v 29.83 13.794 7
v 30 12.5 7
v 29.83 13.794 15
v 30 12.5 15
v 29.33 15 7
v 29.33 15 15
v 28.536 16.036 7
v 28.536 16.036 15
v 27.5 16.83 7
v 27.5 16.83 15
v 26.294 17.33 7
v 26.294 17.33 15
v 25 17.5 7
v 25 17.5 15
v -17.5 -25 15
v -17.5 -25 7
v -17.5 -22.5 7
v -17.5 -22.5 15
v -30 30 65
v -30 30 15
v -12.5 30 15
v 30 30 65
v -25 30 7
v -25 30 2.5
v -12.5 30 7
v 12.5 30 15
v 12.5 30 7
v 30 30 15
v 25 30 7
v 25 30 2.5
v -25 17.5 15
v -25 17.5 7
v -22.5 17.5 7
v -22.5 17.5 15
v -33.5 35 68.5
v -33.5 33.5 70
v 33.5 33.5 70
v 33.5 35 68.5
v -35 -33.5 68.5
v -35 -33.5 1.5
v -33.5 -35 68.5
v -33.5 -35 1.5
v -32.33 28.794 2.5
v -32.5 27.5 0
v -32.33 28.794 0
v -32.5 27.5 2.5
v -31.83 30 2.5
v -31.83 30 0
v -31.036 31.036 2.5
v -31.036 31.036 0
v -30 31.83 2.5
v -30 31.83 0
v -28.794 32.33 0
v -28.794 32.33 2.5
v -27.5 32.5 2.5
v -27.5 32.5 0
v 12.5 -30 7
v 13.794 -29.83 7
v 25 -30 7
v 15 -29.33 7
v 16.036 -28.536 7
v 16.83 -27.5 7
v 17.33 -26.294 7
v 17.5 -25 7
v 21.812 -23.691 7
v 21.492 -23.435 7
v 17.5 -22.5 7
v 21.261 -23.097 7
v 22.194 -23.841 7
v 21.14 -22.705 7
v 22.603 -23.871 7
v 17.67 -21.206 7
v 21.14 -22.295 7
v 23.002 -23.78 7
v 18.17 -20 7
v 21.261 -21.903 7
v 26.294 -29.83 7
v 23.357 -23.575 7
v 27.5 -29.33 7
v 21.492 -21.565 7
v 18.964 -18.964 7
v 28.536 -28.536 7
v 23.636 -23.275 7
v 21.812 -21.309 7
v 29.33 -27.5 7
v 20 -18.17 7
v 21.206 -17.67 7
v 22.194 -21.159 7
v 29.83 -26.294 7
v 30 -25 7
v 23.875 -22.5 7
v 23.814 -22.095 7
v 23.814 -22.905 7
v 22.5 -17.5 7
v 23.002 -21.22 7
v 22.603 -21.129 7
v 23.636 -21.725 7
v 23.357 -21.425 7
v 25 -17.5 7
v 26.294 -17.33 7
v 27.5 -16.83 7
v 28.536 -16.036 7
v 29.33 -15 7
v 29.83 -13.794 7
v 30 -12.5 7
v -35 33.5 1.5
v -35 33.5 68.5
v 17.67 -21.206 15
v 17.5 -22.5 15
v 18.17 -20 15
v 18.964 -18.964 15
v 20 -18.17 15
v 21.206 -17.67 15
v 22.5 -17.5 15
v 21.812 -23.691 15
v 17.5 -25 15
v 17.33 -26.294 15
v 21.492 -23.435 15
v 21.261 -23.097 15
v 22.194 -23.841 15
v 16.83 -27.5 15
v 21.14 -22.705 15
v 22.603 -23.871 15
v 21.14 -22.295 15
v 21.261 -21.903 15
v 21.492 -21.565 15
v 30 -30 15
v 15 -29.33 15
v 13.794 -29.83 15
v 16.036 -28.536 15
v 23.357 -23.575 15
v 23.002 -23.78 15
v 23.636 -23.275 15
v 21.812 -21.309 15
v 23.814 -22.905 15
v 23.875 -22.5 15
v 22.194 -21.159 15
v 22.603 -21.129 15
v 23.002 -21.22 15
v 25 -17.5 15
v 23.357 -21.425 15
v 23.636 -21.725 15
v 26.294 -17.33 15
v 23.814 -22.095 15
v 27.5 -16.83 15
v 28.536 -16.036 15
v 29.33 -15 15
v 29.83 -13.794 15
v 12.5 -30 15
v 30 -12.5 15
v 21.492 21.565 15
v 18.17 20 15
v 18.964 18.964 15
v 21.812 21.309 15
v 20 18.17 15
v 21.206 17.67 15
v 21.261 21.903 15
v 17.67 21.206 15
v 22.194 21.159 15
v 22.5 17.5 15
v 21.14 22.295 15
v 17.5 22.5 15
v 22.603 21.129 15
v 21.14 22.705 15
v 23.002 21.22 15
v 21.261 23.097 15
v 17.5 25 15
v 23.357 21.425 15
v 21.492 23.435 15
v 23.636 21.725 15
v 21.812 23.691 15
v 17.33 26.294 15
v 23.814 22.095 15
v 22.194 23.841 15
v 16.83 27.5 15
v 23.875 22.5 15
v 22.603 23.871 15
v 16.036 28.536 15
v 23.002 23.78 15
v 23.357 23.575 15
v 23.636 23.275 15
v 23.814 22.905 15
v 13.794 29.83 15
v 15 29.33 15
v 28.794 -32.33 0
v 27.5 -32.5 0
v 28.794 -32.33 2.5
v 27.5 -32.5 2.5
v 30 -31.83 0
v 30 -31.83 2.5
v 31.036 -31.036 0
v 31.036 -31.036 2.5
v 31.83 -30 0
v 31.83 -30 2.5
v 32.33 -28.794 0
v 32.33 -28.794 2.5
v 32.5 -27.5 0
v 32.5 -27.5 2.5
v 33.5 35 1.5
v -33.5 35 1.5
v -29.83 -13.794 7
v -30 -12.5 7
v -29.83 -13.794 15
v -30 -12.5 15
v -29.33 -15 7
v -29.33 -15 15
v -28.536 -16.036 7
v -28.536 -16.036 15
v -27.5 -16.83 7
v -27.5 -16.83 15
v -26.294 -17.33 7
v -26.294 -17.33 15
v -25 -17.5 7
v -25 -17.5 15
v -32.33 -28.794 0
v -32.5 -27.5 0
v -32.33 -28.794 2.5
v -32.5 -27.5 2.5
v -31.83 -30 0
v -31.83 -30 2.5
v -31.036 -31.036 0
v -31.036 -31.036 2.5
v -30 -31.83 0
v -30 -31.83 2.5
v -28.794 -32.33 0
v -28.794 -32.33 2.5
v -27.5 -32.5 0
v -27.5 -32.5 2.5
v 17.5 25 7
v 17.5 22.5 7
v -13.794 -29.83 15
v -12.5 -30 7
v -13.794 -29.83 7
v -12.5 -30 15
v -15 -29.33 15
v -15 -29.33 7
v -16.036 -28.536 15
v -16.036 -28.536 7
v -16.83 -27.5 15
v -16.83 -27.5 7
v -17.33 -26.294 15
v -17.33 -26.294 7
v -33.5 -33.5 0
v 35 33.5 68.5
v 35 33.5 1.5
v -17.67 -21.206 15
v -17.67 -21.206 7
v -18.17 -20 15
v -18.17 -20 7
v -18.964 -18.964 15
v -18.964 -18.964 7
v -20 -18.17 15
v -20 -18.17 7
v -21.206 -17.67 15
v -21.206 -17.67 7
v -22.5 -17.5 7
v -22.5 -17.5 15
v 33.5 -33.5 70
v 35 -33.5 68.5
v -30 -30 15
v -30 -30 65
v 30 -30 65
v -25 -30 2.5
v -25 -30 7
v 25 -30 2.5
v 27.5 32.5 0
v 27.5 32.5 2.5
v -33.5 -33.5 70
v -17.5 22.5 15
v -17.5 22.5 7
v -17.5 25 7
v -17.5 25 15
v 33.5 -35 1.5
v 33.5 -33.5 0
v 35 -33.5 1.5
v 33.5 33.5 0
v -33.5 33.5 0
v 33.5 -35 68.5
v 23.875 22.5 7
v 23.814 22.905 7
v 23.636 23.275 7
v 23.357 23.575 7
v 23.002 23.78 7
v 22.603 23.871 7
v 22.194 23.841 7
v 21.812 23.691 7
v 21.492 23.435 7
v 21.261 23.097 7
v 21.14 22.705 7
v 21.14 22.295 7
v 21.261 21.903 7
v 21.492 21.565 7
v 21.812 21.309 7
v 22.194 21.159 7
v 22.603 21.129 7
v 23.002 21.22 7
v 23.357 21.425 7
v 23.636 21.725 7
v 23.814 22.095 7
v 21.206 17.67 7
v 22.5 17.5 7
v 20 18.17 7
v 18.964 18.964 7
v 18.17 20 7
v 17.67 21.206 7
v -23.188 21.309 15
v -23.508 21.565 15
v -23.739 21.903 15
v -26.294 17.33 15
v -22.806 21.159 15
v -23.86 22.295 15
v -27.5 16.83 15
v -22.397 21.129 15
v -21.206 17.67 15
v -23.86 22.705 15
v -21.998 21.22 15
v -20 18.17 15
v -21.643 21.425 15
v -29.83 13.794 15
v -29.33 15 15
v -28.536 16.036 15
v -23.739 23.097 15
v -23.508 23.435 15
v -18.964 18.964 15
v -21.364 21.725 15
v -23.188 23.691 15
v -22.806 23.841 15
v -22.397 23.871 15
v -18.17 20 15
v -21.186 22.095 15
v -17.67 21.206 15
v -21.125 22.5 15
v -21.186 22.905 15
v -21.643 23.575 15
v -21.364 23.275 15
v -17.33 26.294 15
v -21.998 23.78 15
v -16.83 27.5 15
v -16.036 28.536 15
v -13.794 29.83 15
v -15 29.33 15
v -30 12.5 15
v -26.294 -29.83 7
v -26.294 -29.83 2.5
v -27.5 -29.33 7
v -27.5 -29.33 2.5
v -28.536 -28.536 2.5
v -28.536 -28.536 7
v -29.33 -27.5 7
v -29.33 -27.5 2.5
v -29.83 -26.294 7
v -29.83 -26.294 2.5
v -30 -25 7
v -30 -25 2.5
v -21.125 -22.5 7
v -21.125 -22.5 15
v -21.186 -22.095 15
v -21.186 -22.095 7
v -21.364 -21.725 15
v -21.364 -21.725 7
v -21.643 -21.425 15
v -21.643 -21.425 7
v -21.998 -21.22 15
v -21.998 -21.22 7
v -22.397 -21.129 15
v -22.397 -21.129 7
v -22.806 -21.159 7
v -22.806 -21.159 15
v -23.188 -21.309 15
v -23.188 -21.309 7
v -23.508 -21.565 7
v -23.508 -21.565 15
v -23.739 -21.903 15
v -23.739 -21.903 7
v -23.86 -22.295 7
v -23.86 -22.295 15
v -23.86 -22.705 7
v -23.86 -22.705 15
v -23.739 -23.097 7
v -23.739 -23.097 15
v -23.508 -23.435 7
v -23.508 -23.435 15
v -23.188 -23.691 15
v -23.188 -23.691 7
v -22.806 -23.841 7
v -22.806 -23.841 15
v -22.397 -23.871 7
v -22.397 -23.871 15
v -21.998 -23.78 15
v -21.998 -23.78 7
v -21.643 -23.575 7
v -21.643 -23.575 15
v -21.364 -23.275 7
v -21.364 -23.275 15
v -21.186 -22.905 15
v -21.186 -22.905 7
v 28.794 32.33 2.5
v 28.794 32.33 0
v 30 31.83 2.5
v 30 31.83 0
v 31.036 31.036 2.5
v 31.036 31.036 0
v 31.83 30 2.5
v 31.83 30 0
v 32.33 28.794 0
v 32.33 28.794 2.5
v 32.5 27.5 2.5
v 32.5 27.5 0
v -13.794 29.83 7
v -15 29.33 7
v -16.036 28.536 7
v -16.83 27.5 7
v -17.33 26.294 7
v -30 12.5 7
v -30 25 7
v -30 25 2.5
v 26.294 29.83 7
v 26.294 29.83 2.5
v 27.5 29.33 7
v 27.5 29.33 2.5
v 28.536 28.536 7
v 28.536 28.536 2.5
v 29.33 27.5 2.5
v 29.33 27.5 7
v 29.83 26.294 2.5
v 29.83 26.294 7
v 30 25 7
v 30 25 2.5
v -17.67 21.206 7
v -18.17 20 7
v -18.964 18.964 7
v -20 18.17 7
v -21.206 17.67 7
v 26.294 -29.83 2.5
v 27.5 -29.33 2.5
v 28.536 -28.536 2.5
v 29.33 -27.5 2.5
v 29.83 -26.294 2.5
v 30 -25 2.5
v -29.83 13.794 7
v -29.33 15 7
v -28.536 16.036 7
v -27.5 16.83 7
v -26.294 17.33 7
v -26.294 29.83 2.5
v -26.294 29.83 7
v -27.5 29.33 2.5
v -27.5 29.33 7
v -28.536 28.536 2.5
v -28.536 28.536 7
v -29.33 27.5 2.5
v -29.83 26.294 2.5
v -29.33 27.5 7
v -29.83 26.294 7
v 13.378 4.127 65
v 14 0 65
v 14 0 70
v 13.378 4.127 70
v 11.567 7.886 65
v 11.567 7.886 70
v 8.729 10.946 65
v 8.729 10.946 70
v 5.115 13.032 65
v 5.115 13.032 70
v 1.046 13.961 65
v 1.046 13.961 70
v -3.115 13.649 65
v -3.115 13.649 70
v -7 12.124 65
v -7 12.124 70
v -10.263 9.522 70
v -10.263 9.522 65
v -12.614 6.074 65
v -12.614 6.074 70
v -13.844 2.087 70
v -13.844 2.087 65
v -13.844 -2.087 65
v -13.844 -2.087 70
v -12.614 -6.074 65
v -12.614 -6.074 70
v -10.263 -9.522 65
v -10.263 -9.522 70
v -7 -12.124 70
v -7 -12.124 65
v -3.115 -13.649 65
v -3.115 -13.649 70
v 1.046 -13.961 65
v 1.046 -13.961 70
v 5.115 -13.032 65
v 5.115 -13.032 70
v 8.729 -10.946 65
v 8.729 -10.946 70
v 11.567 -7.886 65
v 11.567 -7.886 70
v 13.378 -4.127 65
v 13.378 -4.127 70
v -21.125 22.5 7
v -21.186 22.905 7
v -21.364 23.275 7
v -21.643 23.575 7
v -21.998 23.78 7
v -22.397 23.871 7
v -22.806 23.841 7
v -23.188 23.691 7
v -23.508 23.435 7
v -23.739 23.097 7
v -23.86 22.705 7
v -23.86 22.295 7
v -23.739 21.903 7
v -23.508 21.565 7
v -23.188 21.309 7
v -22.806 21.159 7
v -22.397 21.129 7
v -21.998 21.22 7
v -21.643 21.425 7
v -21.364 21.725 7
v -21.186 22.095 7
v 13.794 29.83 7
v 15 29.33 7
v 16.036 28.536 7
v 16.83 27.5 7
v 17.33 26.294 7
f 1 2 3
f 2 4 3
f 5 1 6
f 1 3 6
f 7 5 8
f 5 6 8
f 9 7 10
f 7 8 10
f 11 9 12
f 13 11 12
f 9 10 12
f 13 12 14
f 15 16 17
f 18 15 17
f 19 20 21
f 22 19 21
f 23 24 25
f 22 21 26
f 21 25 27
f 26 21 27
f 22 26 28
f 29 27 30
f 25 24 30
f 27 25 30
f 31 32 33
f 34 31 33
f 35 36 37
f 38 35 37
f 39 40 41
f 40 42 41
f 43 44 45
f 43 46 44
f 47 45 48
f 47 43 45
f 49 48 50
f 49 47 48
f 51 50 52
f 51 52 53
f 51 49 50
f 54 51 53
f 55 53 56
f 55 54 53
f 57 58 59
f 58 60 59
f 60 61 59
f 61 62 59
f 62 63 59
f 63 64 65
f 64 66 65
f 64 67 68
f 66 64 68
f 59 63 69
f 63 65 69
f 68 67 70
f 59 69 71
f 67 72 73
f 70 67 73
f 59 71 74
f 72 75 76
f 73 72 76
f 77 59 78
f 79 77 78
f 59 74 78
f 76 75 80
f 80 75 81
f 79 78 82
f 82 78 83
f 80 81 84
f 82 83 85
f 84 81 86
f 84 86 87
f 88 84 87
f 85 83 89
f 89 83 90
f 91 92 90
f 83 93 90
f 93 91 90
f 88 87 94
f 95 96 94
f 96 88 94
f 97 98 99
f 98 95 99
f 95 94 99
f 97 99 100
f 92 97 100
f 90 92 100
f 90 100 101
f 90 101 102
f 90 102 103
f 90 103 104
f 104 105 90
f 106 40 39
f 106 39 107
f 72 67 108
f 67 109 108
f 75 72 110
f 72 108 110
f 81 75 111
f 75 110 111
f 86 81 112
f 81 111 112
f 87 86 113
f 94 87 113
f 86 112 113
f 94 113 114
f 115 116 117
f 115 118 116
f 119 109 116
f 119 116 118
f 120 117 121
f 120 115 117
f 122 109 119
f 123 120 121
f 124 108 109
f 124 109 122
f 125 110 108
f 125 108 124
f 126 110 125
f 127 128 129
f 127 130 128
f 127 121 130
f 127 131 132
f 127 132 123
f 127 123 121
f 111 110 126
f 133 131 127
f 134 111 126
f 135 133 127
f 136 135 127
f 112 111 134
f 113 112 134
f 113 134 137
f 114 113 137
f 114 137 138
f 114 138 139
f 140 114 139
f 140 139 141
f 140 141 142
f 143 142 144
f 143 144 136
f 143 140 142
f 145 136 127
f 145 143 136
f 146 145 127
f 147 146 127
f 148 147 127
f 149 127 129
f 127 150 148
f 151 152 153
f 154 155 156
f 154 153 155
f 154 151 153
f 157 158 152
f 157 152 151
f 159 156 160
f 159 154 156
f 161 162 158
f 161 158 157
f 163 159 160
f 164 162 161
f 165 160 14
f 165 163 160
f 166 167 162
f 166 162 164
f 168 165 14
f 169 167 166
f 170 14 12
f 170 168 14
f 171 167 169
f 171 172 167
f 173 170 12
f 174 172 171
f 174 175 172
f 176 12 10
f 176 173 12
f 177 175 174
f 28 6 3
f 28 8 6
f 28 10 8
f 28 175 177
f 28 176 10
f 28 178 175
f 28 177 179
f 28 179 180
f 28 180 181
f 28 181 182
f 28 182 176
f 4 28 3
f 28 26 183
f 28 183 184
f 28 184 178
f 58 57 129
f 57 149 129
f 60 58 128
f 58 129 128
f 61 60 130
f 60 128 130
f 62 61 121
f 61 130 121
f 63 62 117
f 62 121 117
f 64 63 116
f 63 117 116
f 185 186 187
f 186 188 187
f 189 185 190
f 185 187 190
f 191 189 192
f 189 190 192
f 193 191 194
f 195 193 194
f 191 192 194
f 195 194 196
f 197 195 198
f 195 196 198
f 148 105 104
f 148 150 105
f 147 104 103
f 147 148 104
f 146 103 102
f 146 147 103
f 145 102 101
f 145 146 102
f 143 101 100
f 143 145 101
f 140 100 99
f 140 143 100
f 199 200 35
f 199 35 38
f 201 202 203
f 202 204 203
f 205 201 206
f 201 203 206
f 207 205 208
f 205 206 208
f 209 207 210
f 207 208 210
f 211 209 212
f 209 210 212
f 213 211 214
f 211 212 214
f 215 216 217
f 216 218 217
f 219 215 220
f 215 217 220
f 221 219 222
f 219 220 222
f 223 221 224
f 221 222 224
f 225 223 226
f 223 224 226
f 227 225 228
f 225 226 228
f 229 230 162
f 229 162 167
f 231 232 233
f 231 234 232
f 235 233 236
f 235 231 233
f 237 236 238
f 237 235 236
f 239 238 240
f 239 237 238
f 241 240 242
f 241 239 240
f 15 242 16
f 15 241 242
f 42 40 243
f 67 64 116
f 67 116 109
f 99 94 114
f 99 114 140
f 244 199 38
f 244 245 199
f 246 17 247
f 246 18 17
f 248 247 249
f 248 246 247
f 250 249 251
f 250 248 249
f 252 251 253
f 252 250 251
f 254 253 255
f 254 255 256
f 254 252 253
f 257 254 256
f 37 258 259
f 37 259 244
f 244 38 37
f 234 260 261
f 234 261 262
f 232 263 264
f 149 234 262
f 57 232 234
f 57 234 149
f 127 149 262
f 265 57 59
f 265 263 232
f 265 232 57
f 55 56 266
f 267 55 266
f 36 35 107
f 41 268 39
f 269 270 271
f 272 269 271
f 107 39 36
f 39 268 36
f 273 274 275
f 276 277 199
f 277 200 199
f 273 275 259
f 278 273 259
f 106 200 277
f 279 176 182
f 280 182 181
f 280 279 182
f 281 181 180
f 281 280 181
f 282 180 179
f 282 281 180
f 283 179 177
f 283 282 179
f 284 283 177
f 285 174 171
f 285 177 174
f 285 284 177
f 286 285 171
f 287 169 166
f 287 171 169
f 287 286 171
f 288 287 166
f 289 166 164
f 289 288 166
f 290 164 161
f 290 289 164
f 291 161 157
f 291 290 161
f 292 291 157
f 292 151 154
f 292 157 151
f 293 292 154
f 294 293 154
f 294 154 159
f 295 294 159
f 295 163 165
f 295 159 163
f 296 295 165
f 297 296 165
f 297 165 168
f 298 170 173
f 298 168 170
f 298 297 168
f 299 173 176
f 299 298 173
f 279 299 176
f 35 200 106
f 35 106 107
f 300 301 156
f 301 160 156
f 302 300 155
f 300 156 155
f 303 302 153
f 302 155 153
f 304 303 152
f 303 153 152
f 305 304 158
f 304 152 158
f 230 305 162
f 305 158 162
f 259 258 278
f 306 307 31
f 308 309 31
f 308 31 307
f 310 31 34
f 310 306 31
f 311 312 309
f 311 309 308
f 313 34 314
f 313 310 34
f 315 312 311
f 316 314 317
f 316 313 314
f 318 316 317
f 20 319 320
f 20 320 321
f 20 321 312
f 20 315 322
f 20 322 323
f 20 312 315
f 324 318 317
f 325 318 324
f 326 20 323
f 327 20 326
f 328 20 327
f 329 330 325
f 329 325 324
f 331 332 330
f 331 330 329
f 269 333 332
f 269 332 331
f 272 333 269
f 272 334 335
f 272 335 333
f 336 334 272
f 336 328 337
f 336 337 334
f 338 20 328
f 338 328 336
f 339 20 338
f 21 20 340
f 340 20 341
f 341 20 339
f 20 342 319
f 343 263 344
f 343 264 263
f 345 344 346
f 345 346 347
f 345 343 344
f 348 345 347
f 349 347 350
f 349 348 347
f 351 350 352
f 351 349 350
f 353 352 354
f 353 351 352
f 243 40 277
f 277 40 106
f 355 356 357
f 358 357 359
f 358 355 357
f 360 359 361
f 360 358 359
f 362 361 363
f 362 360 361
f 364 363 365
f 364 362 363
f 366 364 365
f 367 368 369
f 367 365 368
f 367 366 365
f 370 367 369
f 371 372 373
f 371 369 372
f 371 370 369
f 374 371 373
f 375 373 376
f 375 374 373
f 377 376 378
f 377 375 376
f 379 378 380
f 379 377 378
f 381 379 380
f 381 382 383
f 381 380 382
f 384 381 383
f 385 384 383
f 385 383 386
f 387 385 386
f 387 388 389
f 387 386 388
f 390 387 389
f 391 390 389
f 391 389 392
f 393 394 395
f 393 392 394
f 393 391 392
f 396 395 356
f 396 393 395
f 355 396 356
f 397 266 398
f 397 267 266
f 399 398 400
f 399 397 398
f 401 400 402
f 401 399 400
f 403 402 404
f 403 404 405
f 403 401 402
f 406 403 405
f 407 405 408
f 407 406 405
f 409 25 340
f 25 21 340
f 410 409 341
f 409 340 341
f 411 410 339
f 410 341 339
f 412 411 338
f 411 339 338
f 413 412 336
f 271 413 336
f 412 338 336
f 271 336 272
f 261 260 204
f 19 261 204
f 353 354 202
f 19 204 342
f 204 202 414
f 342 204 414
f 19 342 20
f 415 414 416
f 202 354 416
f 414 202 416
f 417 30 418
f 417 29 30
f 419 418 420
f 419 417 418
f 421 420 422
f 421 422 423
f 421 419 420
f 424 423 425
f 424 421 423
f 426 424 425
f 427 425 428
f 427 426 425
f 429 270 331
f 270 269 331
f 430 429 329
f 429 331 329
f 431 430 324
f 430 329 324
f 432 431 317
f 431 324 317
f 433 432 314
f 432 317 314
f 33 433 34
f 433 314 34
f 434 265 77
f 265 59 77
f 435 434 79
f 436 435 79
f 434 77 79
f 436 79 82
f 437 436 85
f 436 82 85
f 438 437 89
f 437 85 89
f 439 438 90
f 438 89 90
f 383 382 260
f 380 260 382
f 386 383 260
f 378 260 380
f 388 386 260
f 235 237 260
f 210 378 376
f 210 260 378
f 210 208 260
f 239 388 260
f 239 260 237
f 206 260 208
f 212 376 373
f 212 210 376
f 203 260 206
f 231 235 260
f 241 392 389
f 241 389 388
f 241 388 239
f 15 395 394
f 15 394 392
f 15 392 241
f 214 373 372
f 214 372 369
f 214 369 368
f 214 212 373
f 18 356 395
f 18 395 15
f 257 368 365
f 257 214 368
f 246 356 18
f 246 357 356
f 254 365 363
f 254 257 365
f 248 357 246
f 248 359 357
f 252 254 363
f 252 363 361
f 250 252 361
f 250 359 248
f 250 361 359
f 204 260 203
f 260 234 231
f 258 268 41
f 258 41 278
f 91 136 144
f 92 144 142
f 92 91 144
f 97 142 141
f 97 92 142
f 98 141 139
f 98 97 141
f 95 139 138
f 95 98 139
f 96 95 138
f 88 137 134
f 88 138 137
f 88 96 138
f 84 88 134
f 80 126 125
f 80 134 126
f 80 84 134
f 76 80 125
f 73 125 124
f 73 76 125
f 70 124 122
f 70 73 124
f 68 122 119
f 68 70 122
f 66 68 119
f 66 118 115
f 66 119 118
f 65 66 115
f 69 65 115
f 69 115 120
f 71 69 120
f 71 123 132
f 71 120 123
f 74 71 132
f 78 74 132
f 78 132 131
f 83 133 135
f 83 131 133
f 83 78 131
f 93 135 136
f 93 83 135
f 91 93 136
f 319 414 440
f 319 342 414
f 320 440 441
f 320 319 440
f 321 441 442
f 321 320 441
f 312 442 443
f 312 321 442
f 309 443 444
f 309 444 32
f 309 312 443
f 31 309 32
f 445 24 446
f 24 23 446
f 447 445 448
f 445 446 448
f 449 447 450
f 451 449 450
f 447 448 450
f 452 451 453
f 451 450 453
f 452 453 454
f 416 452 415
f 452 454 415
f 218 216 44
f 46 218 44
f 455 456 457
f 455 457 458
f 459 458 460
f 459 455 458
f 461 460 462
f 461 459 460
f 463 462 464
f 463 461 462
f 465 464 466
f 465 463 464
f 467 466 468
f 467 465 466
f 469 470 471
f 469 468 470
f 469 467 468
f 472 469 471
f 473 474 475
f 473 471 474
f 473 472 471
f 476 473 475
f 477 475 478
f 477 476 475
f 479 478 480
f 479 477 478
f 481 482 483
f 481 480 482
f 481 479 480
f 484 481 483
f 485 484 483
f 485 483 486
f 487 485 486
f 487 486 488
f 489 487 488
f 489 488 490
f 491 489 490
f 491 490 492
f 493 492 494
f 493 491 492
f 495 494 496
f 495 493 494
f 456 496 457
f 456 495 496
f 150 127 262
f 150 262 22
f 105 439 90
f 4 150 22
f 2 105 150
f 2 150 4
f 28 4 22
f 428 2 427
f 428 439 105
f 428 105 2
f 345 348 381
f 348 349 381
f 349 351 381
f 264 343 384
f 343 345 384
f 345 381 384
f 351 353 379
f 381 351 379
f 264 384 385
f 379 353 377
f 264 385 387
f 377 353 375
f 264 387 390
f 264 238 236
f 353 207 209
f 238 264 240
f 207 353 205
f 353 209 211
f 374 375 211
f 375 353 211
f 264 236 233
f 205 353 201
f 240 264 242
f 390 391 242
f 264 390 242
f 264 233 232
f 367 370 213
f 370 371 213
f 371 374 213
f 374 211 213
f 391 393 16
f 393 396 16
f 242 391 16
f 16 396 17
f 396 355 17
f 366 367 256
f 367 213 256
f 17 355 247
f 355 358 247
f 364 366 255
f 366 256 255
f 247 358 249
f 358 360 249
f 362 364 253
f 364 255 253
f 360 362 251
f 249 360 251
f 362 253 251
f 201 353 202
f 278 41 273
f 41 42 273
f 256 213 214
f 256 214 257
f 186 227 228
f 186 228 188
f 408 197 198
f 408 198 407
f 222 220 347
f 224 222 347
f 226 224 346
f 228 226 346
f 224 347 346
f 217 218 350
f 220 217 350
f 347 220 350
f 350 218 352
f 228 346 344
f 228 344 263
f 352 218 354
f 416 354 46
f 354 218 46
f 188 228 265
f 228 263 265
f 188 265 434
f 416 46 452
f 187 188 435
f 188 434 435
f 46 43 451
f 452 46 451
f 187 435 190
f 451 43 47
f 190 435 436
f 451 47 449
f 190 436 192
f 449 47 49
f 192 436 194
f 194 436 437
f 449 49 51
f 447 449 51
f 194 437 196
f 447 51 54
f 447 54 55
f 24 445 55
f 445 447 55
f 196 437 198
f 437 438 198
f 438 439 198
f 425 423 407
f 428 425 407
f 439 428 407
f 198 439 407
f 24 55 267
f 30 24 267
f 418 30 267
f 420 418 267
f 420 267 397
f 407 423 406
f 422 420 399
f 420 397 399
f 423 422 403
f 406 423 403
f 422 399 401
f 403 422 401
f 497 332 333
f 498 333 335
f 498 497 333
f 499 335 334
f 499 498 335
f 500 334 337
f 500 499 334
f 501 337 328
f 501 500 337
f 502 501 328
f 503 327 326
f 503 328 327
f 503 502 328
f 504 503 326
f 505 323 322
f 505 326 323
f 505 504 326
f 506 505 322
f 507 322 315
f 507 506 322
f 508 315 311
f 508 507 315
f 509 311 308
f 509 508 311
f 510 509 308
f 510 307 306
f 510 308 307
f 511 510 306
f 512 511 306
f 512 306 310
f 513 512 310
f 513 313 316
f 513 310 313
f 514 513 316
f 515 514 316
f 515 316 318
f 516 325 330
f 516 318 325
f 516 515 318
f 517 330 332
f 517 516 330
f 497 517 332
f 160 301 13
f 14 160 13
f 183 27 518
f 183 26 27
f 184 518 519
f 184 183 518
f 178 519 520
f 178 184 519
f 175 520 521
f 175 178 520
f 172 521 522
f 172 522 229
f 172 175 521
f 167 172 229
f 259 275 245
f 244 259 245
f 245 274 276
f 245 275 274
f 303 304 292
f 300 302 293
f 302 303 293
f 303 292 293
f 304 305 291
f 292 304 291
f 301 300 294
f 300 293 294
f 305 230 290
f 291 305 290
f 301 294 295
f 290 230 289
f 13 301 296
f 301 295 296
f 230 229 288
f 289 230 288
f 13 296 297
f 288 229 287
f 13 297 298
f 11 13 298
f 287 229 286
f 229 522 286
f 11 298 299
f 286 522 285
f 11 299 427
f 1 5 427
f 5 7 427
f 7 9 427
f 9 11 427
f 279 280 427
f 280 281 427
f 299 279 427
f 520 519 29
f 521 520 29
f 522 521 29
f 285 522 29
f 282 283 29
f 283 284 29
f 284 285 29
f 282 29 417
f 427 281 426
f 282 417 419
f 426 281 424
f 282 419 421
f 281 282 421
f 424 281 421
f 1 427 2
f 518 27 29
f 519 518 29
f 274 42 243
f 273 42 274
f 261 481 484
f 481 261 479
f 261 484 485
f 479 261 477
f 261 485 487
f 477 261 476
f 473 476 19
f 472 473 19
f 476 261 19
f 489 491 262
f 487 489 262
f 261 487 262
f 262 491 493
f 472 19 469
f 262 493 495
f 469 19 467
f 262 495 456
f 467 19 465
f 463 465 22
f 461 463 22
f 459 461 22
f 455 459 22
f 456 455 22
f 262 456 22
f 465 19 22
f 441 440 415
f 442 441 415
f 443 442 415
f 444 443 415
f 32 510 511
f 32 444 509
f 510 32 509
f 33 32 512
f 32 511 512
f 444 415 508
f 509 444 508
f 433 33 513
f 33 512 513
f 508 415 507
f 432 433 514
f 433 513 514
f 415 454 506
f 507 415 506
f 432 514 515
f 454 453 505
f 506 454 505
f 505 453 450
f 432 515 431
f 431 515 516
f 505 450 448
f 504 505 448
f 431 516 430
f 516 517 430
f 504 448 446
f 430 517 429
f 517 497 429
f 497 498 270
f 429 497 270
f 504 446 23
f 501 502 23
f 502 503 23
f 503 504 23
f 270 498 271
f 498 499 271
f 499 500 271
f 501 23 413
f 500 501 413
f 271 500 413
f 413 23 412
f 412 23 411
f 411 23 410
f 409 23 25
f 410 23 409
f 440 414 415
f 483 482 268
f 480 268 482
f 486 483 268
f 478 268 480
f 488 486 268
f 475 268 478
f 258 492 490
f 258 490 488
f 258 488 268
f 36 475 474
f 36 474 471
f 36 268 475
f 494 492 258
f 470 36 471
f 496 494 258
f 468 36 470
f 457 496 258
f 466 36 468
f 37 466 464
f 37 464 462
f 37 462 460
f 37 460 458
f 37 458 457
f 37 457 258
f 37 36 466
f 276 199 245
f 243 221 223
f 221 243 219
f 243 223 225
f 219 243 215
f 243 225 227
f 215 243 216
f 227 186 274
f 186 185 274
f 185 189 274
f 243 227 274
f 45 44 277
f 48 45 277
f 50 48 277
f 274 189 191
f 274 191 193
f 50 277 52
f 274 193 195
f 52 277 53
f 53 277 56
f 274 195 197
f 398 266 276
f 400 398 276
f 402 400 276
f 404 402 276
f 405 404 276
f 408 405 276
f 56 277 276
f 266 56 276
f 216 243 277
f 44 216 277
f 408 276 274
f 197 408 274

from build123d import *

# Parameters (mm, degrees)
SKETCH_W        = 70
SKETCH_H        = 70
PAD_DEPTH       = 70
SKETCH001_W     = 60
SKETCH001_H     = 60
POCKET_DEPTH    = 65
SKETCH002_W     = 65
SKETCH002_H     = 65
POCKET001_DEPTH = 2.5
SKETCH004_W     = 12.5
SKETCH004_H     = 12.5
PAD001_DEPTH    = 8
SKETCH005_R     = 1.375
POCKET002_DEPTH = 10
SKETCH006_R     = 14
POCKET003_DEPTH = 70.001
FILLET_R        = 5
FILLET001_R     = 5
FILLET002_R     = 5
CHAMFER_SIZE    = 1.5


with BuildPart() as part:
    # Sketch → Pad (new body)
    with BuildSketch(Plane.XY):
        Rectangle(SKETCH_W, SKETCH_H)
    extrude(amount=PAD_DEPTH)

    # Sketch001 → Pocket (cut)
    with BuildSketch(Plane.XY):
        Rectangle(SKETCH001_W, SKETCH001_H)
    extrude(amount=POCKET_DEPTH, mode=Mode.SUBTRACT)

    # Sketch002 → Pocket001 (cut)
    with BuildSketch(Plane.XY):
        Rectangle(SKETCH002_W, SKETCH002_H)
    extrude(amount=POCKET001_DEPTH, mode=Mode.SUBTRACT)

    # Sketch004 (on DatumPlane) → Pad001 (join)
    with BuildSketch(Plane.XY.offset(7)):
        with Locations((-23.75, 23.75)):
            Rectangle(SKETCH004_W, SKETCH004_H)
        with Locations((23.75, 23.75)):
            Rectangle(SKETCH004_W, SKETCH004_H)
        with Locations((-23.75, -23.75)):
            Rectangle(SKETCH004_W, SKETCH004_H)
        with Locations((23.75, -23.75)):
            Rectangle(SKETCH004_W, SKETCH004_H)
    extrude(amount=PAD001_DEPTH)

    # Sketch005 (on DatumPlane) → Pocket002 (cut)
    with BuildSketch(Plane.XY.offset(7)):
        with Locations((-22.5, 22.5)):
            Circle(SKETCH005_R)
        with Locations((22.5, 22.5)):
            Circle(SKETCH005_R)
        with Locations((22.5, -22.5)):
            Circle(SKETCH005_R)
        with Locations((-22.5, -22.5)):
            Circle(SKETCH005_R)
    extrude(amount=POCKET002_DEPTH, mode=Mode.SUBTRACT)

    # Sketch006 → Pocket003 (cut, through all)
    with BuildSketch(Plane.XY):
        Circle(SKETCH006_R)
    extrude(amount=POCKET003_DEPTH, mode=Mode.SUBTRACT)

    # Fillet
    fillet_edges = [part.edges().sort_by_distance(p)[0] for p in [
        (17.5, 30, 11),
        (17.5, 17.5, 11),
        (30, 17.5, 11),
        (30, -17.5, 11),
        (17.5, -17.5, 11),
        (17.5, -30, 11),
        (-17.5, -30, 11),
        (-17.5, -17.5, 11),
        (-30, -17.5, 11),
        (-30, 17.5, 11),
        (-17.5, 17.5, 11),
        (-17.5, 30, 11),
    ]]
    fillet(fillet_edges, radius=FILLET_R)

    # Fillet001
    fillet001_edges = [part.edges().sort_by_distance(p)[0] for p in [
        (30, 30, 4.75),
        (30, -30, 4.75),
        (-30, -30, 4.75),
        (-30, 30, 4.75),
    ]]
    fillet(fillet001_edges, radius=FILLET001_R)

    # Fillet002
    fillet002_edges = [part.edges().sort_by_distance(p)[0] for p in [
        (32.5, -32.5, 1.25),
        (32.5, 32.5, 1.25),
        (-32.5, 32.5, 1.25),
        (-32.5, -32.5, 1.25),
    ]]
    fillet(fillet002_edges, radius=FILLET002_R)

    # Chamfer
    chamfer_edges = [part.edges().sort_by_distance(p)[0] for p in [
        (35, 35, 35),
        (0, 35, 0),
        (35, 0, 0),
        (-35, 35, 35),
        (0, 35, 70),
        (-35, 0, 70),
        (0, -35, 70),
        (35, 0, 70),
        (-35, -35, 35),
        (-35, 0, 0),
        (0, -35, 0),
        (35, -35, 35),
    ]]
    chamfer(chamfer_edges, length=CHAMFER_SIZE)


solid = part.part
